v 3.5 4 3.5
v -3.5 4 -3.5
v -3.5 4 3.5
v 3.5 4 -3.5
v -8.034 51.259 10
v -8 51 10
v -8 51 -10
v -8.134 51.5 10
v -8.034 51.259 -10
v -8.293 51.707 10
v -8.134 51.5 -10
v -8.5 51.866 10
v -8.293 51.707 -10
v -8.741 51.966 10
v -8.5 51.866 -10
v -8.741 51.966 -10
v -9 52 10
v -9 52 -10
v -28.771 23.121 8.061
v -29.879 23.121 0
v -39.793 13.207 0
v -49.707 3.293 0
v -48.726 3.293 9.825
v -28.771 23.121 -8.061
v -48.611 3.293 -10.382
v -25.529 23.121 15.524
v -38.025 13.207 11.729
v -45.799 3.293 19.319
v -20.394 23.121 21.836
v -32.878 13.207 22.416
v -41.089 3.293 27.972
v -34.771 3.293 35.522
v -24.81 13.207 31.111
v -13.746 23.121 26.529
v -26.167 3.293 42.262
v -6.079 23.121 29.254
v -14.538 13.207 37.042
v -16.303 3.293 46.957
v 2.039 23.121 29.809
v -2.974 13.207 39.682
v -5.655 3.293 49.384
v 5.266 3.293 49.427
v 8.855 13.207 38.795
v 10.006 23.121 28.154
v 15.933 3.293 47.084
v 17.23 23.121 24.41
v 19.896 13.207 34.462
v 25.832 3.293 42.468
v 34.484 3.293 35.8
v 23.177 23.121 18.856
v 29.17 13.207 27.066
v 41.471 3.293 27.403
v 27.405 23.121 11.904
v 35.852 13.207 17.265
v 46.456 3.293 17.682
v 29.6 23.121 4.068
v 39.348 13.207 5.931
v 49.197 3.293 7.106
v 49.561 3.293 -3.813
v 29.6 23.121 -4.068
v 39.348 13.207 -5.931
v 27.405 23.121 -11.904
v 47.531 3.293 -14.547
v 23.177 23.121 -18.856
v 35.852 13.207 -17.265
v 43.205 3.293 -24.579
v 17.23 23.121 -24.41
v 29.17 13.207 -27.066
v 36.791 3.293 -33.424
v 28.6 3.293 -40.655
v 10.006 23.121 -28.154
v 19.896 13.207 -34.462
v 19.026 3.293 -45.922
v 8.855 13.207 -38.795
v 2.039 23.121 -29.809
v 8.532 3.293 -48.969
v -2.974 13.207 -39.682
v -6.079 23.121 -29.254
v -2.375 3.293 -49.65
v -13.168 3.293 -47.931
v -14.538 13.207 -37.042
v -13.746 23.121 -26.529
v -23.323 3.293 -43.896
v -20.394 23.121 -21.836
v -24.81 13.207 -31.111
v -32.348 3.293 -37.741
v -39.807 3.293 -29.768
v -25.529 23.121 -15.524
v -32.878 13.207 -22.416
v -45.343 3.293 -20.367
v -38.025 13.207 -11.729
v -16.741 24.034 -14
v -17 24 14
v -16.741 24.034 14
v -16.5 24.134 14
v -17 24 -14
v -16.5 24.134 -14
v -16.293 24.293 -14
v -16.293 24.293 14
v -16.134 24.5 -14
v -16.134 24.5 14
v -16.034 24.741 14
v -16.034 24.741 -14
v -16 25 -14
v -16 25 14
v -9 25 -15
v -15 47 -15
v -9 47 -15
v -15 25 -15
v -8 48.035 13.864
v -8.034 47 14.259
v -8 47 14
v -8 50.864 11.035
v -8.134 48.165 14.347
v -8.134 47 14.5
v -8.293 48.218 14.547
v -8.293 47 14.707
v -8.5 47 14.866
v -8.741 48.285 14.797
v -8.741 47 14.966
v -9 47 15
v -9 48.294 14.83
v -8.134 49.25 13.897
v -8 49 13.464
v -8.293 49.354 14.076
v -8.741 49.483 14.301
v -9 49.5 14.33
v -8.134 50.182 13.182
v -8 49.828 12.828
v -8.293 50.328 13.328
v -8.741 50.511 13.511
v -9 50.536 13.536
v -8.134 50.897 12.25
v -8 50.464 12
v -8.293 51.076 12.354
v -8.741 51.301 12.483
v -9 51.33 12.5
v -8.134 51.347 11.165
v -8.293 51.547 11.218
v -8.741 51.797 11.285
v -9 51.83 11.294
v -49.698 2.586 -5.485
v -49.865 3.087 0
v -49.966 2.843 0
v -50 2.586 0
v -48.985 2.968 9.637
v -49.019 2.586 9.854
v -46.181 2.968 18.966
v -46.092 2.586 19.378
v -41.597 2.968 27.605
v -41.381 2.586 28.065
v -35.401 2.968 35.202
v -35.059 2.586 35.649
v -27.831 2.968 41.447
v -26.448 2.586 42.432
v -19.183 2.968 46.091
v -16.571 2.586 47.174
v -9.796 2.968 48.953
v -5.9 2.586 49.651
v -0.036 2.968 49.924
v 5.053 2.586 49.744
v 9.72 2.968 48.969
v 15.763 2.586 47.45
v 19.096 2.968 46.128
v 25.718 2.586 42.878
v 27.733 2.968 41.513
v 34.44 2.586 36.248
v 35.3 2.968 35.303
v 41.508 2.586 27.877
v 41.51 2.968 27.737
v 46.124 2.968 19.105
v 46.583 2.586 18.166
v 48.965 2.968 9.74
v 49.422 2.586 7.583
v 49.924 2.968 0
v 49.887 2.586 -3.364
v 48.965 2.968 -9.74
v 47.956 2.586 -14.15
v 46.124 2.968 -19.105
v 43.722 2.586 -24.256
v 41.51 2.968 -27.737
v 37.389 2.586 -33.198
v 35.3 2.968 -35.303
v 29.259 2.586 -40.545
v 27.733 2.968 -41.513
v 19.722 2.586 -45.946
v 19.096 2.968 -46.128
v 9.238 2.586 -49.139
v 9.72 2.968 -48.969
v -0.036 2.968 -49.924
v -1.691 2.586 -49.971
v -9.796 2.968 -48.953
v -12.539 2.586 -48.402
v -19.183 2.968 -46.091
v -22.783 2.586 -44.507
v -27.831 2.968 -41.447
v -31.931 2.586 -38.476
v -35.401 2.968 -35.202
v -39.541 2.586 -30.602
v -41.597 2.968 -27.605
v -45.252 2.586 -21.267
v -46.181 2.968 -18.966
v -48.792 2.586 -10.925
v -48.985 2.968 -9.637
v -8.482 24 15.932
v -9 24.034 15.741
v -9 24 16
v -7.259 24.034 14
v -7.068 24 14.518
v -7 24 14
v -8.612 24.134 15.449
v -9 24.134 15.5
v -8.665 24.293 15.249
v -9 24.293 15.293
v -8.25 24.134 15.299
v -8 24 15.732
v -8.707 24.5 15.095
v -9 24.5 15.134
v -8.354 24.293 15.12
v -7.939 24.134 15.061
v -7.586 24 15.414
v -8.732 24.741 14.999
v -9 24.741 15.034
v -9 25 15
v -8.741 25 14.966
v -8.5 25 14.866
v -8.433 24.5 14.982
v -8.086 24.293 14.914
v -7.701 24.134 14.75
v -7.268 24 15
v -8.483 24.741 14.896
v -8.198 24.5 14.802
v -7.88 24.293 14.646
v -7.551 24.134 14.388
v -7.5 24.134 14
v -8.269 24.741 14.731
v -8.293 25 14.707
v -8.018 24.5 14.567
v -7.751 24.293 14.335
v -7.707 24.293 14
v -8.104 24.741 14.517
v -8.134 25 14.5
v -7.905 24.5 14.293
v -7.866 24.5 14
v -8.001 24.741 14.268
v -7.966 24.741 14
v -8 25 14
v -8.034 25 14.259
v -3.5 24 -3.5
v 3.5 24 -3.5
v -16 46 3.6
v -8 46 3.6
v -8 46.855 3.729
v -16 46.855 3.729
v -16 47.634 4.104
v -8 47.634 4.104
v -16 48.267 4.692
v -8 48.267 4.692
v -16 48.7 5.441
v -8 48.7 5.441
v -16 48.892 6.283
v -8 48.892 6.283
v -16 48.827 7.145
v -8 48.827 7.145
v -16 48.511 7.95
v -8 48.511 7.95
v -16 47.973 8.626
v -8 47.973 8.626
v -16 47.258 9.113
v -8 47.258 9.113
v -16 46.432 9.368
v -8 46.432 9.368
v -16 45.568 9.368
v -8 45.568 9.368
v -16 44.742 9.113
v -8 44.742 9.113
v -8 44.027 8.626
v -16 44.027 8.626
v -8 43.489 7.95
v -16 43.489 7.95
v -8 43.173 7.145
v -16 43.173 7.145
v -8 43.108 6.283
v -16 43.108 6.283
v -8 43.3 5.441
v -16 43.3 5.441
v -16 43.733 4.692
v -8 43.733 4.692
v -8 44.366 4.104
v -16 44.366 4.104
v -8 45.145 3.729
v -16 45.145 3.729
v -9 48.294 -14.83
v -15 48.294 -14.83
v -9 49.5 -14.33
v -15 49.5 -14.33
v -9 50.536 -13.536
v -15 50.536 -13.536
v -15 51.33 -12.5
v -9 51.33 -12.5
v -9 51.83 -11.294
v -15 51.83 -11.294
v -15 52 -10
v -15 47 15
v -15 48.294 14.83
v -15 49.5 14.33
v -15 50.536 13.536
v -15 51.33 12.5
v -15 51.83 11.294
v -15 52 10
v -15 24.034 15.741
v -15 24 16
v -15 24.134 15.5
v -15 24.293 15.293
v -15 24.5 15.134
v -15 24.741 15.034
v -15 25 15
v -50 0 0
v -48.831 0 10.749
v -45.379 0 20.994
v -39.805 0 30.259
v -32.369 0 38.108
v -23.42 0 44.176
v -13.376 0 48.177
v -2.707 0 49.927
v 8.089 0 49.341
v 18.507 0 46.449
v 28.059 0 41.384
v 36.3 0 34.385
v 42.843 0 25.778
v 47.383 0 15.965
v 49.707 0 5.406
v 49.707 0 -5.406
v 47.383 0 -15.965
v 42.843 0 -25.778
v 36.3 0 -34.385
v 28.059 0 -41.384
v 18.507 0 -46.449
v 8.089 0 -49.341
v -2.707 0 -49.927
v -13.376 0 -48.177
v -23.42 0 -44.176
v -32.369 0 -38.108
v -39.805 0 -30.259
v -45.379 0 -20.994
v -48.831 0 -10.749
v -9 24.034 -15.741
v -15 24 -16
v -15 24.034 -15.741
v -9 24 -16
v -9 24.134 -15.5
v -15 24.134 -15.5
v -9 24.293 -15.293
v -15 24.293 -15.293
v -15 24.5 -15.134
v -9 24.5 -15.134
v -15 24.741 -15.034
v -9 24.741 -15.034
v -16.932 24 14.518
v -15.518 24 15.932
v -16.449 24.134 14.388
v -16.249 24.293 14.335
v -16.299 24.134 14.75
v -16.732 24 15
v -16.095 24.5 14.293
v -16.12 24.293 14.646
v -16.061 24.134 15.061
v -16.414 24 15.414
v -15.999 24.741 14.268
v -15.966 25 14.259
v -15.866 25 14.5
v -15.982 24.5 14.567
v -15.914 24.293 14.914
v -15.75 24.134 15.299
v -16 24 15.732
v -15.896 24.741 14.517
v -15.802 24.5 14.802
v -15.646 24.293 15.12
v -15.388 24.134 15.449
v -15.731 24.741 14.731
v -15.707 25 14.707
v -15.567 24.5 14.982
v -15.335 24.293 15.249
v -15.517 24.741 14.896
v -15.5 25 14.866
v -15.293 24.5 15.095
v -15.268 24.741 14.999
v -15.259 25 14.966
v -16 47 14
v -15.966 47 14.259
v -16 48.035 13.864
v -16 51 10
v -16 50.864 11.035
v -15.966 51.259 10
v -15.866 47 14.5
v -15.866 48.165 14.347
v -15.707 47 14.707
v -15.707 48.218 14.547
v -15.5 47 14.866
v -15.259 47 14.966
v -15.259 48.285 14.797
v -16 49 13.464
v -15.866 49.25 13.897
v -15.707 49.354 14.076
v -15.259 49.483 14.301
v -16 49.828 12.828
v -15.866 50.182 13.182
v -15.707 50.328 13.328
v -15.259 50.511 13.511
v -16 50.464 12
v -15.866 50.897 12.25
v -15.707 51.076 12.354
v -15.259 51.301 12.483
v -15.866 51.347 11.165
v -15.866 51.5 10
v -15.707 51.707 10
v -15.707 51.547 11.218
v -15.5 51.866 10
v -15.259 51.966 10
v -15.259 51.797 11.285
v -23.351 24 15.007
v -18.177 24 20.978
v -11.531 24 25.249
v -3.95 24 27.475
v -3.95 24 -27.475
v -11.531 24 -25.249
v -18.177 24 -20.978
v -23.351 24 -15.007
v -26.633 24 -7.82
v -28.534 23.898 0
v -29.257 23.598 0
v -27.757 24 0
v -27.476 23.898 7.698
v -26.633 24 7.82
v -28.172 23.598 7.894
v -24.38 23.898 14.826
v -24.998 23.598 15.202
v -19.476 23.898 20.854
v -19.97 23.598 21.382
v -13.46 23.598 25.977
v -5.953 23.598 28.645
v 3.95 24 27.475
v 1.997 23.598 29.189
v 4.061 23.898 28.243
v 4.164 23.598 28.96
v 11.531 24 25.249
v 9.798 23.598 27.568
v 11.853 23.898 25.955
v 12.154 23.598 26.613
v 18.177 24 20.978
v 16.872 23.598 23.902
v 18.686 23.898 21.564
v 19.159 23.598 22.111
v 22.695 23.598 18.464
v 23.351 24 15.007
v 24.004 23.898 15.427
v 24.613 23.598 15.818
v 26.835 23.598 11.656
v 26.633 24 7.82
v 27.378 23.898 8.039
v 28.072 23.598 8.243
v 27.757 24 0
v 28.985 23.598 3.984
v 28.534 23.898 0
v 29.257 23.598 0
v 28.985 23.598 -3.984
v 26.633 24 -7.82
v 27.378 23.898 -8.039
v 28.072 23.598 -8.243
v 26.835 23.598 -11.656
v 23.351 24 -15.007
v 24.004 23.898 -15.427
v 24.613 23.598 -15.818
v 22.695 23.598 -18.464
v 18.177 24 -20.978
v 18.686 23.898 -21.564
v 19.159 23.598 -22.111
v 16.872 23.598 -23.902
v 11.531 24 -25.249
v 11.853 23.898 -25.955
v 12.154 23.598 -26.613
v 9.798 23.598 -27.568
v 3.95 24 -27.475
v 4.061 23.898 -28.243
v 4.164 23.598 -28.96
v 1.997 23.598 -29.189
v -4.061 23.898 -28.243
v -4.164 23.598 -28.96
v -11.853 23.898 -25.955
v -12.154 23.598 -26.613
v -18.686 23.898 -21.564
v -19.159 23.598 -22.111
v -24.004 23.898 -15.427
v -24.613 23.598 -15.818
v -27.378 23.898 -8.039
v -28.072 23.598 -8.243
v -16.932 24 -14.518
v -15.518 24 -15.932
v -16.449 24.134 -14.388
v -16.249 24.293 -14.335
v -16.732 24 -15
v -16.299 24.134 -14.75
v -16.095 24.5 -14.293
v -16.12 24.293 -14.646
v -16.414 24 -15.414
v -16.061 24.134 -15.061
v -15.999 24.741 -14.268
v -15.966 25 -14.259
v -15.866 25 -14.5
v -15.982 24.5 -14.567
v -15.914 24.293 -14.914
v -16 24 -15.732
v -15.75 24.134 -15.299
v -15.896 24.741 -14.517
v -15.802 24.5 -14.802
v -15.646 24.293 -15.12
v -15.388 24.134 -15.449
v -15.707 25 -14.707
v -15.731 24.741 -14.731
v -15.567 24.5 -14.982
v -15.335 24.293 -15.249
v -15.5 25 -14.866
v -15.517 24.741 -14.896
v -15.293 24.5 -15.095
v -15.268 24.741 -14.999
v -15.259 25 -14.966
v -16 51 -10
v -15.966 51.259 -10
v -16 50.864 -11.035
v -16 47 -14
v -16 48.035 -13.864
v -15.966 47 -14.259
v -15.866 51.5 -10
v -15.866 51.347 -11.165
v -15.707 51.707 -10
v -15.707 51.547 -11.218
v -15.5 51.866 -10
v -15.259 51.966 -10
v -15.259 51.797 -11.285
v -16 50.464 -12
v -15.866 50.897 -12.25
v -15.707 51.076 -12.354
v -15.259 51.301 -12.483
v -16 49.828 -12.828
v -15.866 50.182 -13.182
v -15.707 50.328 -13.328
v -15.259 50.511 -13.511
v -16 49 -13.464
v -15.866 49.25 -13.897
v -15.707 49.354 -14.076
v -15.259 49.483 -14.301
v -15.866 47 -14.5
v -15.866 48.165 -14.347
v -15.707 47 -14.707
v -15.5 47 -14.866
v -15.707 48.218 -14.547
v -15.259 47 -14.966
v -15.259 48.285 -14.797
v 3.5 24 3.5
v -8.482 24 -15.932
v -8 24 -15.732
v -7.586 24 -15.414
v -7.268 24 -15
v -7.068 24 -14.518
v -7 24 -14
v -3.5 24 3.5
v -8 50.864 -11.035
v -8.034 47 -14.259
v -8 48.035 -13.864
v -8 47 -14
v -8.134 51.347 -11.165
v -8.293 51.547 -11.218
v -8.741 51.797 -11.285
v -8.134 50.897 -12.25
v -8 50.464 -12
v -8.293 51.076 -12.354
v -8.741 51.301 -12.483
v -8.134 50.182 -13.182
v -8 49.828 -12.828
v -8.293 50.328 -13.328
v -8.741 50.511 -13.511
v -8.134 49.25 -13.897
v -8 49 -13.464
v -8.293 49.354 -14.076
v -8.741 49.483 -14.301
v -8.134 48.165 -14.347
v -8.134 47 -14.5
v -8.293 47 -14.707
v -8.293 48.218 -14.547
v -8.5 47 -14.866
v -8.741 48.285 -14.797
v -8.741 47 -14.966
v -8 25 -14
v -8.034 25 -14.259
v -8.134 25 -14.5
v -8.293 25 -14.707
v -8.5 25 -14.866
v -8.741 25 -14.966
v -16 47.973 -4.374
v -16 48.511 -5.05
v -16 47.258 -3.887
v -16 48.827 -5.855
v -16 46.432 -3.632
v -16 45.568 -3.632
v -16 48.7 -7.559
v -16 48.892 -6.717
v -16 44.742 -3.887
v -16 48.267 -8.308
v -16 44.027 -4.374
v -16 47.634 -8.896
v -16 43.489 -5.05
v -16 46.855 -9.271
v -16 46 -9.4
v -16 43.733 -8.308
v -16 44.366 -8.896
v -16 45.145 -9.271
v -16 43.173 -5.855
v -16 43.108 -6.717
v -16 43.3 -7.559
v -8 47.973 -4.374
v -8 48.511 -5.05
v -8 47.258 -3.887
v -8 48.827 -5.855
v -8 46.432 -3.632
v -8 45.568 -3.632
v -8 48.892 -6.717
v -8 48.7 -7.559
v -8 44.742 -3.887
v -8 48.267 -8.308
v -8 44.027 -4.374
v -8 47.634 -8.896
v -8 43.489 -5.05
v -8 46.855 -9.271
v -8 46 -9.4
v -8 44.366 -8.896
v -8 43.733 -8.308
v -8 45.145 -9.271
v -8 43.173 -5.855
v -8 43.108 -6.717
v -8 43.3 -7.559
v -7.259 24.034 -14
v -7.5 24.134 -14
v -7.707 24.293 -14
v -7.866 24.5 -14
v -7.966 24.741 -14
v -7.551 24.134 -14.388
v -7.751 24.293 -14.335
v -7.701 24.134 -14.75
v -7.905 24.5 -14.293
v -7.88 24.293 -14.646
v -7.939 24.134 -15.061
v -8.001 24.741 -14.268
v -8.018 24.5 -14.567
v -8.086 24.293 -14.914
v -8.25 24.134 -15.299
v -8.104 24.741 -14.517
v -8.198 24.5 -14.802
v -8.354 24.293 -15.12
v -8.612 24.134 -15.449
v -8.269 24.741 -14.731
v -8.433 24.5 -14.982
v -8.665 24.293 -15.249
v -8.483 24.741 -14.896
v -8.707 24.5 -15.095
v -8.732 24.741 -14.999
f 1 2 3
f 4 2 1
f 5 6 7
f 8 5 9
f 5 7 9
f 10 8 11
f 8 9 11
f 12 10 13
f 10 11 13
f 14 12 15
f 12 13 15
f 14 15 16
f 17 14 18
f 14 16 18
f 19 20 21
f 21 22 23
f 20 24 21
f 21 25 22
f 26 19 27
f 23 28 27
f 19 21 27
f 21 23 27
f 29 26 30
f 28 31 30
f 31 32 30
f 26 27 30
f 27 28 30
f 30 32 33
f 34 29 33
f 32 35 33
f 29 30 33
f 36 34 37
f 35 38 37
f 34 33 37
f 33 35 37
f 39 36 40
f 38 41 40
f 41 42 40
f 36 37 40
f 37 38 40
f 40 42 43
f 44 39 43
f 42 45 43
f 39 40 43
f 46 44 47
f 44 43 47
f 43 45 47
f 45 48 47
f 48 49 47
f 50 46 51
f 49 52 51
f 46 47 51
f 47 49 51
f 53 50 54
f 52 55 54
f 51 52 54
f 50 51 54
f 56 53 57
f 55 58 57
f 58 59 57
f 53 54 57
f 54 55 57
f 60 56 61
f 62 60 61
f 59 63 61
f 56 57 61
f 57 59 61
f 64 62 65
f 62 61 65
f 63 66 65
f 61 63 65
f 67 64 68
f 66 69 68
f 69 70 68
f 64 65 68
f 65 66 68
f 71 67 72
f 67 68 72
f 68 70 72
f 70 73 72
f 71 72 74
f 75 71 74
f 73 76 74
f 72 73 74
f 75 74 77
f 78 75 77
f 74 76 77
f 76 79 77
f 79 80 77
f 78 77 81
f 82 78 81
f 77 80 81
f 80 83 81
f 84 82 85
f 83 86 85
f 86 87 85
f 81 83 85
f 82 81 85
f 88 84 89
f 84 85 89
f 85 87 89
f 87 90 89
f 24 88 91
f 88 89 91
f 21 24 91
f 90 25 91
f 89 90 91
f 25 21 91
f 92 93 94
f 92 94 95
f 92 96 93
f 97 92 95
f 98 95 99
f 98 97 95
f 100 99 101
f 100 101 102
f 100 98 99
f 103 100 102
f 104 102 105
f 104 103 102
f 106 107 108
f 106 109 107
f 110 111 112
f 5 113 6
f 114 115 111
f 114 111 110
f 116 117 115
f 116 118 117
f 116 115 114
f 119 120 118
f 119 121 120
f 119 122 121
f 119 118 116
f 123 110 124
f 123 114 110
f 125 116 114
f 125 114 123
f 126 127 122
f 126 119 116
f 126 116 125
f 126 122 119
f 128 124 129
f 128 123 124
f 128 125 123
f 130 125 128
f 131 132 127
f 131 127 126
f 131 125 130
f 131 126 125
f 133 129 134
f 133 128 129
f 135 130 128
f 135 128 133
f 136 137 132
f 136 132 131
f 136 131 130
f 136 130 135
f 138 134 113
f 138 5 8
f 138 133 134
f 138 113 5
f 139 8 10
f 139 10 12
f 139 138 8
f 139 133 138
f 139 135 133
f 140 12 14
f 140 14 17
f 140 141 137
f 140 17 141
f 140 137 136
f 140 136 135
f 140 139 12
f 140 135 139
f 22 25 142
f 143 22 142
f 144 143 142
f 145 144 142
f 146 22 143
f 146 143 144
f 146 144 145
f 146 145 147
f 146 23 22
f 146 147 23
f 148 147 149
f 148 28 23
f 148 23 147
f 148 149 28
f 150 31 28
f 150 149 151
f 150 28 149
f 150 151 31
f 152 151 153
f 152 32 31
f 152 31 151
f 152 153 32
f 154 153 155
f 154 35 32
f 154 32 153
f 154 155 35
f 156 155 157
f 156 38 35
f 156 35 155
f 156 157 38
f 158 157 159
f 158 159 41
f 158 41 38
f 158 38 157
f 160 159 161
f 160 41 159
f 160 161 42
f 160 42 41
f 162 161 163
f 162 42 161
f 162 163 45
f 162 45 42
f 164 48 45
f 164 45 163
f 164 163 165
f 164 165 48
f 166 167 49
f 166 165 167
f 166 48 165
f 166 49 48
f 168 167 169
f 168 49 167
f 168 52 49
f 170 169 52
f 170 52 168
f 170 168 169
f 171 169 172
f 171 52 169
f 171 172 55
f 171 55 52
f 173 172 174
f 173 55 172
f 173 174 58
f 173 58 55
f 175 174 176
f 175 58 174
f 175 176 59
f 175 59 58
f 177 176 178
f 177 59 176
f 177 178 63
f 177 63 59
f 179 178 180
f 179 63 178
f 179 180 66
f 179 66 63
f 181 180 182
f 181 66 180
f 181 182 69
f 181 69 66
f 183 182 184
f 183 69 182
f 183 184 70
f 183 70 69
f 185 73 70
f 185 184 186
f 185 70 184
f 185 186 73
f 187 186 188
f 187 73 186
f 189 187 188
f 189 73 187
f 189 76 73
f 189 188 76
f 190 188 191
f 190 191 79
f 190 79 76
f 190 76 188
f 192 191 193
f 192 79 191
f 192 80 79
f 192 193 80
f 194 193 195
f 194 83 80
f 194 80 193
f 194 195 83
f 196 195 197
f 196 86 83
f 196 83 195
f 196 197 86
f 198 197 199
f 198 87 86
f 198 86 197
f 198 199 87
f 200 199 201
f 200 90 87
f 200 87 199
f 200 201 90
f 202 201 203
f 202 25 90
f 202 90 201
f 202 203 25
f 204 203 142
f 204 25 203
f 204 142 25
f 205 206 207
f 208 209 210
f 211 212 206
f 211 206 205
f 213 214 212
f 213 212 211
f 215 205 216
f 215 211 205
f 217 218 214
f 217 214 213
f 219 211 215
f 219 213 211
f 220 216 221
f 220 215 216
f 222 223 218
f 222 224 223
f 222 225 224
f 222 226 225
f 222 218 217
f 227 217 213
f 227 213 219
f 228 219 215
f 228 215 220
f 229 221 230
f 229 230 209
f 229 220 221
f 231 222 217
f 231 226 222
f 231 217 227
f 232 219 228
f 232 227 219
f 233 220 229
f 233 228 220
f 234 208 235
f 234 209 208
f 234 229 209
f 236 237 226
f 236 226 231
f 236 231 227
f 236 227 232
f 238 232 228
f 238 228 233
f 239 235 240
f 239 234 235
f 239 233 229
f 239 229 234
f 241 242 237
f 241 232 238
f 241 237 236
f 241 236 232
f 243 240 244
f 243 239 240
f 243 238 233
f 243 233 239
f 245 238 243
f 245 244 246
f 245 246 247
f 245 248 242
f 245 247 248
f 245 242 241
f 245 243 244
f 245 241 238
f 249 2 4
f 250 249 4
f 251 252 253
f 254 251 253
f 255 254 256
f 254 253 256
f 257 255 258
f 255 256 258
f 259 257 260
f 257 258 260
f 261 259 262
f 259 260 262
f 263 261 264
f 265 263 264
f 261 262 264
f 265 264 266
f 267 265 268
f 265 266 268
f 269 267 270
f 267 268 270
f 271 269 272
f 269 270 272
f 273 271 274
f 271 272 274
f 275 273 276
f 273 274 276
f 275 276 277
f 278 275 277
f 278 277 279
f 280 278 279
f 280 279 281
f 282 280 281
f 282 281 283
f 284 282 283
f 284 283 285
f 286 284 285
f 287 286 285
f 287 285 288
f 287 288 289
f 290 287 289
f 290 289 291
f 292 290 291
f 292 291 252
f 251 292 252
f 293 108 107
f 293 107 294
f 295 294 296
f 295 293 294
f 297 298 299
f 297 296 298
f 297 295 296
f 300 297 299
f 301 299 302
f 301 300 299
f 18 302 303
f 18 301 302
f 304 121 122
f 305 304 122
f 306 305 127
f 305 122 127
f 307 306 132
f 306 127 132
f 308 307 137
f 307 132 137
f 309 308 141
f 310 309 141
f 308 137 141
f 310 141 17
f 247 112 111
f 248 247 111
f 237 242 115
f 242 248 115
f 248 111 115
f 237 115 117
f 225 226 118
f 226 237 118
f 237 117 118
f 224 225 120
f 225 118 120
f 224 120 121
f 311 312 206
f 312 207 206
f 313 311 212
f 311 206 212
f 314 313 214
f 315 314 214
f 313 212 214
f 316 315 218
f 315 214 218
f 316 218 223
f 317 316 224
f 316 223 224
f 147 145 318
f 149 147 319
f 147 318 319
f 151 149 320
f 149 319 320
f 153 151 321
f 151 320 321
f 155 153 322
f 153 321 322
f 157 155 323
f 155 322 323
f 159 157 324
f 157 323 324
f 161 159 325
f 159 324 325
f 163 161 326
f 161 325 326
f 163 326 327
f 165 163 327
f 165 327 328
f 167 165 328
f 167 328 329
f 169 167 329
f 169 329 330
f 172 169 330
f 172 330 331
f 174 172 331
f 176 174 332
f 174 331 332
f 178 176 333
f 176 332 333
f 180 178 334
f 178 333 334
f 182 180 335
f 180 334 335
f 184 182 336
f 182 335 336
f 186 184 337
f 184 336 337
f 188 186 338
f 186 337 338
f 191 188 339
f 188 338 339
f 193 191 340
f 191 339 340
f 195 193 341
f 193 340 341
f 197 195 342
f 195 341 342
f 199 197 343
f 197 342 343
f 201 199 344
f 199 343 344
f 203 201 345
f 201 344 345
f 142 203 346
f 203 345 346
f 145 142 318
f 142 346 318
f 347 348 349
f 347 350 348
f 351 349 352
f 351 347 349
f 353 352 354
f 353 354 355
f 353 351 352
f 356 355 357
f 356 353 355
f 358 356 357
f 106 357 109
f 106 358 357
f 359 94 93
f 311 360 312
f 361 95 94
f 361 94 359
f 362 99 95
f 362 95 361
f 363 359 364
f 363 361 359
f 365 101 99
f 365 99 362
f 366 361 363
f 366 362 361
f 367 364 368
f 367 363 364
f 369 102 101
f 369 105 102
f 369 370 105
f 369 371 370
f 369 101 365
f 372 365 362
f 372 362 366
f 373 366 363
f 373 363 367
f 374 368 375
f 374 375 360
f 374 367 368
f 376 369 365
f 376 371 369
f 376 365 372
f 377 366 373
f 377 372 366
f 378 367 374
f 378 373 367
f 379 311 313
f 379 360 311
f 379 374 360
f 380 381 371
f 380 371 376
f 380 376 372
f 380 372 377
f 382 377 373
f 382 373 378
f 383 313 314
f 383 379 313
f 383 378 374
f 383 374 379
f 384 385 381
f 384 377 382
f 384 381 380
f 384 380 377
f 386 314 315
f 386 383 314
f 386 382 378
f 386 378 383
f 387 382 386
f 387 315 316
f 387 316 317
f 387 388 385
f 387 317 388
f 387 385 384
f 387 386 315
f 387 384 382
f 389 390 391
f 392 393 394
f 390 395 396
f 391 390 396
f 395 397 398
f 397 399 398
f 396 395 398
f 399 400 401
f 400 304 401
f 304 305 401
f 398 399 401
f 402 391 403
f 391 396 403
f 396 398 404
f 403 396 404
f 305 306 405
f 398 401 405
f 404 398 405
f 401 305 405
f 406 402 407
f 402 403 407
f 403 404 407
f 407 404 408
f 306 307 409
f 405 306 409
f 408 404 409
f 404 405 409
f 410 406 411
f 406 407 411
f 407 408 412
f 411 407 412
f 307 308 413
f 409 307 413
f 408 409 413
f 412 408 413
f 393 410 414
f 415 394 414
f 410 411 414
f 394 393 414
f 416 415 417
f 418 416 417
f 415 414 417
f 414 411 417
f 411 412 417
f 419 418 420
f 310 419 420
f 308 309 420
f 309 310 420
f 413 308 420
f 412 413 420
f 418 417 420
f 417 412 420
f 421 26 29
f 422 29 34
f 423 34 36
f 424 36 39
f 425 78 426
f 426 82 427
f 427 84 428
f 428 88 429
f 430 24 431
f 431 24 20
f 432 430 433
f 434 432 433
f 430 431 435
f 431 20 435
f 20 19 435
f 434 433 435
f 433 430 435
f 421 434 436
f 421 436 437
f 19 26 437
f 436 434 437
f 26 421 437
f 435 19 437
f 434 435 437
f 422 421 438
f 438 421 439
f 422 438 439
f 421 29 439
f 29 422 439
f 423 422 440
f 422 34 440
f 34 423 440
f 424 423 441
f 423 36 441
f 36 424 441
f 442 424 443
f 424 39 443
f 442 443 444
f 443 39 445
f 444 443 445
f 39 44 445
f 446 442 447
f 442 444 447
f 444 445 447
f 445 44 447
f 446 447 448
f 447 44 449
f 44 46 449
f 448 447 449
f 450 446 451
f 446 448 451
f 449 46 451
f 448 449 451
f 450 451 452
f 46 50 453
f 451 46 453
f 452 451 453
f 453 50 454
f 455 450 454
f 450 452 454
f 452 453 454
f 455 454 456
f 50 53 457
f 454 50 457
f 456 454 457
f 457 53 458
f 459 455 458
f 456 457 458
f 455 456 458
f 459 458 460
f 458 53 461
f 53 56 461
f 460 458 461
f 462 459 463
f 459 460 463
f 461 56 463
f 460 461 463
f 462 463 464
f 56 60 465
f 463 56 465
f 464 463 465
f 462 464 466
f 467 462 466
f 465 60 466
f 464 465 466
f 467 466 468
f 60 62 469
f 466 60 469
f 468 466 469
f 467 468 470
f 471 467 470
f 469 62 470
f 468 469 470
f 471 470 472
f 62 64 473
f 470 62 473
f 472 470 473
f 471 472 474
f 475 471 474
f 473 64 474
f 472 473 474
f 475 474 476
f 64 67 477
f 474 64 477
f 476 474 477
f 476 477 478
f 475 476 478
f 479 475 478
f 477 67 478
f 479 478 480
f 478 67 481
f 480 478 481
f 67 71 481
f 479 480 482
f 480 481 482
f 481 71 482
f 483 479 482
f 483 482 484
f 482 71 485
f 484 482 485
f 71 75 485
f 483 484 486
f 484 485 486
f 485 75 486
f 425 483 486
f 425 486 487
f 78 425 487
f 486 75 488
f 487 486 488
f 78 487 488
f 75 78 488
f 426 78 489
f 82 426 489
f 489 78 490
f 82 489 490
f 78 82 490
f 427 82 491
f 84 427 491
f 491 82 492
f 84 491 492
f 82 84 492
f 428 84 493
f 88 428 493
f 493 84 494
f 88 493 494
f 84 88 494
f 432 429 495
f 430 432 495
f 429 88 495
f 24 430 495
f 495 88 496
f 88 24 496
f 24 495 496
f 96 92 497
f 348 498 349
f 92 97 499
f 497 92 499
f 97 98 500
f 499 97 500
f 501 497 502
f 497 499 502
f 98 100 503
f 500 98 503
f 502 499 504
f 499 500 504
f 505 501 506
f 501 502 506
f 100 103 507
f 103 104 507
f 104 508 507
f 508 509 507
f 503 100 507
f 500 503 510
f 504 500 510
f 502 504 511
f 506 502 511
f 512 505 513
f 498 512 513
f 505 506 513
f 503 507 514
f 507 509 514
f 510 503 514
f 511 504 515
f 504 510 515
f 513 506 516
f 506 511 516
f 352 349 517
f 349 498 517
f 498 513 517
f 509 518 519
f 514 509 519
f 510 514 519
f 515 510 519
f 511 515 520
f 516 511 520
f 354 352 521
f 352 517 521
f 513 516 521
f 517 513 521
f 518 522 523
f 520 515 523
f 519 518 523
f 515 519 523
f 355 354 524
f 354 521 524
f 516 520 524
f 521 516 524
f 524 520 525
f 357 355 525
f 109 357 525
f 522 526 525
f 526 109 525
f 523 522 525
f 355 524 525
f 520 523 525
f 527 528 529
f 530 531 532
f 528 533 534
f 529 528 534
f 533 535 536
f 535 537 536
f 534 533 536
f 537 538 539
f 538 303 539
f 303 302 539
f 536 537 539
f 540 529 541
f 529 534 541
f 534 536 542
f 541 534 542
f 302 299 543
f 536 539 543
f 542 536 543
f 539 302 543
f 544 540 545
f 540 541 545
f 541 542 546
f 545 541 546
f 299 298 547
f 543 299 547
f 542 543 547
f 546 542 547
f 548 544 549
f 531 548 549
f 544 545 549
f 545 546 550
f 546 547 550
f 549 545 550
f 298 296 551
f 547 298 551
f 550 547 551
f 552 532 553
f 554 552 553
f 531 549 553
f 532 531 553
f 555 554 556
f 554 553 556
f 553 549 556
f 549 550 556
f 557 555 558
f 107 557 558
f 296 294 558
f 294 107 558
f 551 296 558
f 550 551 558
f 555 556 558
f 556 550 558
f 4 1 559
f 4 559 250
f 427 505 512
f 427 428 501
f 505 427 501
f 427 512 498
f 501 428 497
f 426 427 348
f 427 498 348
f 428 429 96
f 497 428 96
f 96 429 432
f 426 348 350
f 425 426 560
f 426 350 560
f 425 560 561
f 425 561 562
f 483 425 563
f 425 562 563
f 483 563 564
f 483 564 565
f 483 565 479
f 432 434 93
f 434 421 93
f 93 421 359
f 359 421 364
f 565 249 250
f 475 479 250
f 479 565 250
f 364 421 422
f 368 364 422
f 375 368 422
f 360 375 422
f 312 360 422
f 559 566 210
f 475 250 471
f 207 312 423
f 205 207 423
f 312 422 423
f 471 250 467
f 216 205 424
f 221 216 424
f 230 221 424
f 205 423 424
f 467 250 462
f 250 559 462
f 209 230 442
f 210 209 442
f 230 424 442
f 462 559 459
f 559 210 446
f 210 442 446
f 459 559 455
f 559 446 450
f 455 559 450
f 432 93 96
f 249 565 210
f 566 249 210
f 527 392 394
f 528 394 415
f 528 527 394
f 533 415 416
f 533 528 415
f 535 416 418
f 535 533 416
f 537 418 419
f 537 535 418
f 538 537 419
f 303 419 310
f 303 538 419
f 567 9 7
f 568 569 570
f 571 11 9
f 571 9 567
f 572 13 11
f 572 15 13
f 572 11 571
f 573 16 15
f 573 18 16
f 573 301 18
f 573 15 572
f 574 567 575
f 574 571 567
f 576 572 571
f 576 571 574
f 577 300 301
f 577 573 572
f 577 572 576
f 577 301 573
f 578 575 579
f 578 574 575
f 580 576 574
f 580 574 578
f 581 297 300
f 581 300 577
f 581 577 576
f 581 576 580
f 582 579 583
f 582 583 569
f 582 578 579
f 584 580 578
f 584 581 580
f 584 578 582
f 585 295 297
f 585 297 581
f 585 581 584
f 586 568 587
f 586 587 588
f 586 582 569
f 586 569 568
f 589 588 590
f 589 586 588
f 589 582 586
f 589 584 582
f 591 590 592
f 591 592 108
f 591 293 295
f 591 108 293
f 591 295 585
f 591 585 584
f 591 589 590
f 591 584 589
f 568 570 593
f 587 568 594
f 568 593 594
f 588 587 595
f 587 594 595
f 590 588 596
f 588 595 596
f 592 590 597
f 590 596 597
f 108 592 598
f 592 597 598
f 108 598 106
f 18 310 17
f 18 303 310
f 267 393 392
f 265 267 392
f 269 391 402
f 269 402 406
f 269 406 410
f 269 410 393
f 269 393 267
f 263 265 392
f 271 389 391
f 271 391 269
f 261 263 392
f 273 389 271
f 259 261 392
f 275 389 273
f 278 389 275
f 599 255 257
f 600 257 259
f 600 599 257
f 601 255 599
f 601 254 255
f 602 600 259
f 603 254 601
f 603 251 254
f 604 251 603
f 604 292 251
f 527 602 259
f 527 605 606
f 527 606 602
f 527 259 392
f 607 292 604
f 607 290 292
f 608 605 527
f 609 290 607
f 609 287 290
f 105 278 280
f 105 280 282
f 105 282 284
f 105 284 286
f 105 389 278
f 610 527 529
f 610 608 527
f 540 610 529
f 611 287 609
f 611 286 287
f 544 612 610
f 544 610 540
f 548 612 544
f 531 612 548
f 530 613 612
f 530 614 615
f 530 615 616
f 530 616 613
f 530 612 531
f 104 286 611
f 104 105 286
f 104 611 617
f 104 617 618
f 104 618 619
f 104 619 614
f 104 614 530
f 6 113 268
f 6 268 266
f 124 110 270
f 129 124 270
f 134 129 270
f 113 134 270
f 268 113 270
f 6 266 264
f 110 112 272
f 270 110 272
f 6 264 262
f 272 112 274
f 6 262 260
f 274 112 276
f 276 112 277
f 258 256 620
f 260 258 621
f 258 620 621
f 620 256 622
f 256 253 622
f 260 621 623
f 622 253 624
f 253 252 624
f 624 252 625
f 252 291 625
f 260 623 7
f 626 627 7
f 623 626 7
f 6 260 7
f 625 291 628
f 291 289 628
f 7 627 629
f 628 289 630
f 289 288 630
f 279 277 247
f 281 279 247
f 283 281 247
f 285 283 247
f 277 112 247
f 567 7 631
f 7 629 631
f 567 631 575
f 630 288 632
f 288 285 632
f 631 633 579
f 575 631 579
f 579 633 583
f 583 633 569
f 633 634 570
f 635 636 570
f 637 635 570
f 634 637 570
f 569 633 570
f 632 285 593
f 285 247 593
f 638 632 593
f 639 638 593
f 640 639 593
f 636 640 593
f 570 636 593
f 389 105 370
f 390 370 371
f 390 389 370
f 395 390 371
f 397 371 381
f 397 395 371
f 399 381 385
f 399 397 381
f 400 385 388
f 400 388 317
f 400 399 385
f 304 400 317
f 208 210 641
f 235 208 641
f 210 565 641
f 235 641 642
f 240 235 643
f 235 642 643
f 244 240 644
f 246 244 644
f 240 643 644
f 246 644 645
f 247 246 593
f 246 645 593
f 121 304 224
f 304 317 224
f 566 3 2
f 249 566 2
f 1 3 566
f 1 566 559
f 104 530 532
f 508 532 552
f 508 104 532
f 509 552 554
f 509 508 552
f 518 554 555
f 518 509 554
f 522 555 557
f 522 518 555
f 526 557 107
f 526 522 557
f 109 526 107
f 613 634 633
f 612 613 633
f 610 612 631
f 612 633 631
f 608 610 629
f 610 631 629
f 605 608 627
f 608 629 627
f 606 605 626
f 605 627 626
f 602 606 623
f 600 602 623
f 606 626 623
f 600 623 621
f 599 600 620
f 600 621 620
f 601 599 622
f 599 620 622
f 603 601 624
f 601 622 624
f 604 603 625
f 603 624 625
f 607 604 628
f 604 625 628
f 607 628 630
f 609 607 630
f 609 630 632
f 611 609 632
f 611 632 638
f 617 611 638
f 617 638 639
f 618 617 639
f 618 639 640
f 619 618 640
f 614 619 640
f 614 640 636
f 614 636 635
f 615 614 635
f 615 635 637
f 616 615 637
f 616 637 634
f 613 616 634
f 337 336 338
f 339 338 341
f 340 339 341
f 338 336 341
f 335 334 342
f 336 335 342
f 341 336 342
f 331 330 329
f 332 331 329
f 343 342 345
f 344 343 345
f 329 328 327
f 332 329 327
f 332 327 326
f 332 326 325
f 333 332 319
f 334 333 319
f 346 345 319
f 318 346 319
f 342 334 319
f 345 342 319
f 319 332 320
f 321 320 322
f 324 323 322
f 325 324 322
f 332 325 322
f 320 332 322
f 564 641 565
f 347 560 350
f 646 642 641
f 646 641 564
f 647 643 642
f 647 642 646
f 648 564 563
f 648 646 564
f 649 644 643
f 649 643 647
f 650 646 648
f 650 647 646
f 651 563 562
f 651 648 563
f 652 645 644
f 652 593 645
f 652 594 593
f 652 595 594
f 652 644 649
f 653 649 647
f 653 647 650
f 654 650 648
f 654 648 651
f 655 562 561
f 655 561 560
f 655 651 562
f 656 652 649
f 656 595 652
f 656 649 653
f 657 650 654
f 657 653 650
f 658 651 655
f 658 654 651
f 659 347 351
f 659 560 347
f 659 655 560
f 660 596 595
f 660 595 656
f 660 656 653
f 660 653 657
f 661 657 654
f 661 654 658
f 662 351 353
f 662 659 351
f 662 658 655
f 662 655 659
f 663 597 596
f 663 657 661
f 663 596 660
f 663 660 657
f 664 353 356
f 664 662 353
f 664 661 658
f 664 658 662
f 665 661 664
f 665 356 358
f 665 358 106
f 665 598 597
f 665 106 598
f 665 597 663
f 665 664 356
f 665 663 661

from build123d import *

# Parameters (mm, degrees)
SKETCH2_W           = 8
SKETCH2_H           = 30
BOSS_EXTRUDE1_DEPTH = 28
CUT_EXTRUDE1_REACH  = 52
SKETCH3_R           = 2.9
FILLET1_R           = 5
FILLET2_R           = 3
FILLET3_R           = 1
FILLET4_R           = 1
SKETCH4_W           = 7
SKETCH4_H           = 7
CUT_EXTRUDE2_DEPTH  = 20


with BuildPart() as part:
    # Sketch1 → Revolve1 (revolve)
    with BuildSketch(Plane.XY):
        Polygon((0, 0), (0, 24), (-29, 24), (-50, 3), (-50, 0), align=None)
    revolve(axis=Axis((0, 0, 0), (0, 1, 0)))

    # Sketch2 → Boss-Extrude1 (add)
    with BuildSketch(Plane(origin=(0, 24, 0), x_dir=(1, 0, 0), z_dir=(0, 1, 0))):
        with Locations((-12, 0)):
            Rectangle(SKETCH2_W, SKETCH2_H)
    extrude(amount=BOSS_EXTRUDE1_DEPTH)

    # Sketch3 → Cut-Extrude1 (cut, up to next)
    with BuildSketch(Plane(origin=(0, 0, 0), x_dir=(0, 0, -1), z_dir=(1, 0, 0)), mode=Mode.PRIVATE) as cut_extrude1_sk1:
        with Locations((-6.5, 46)):
            Circle(SKETCH3_R)
    cut_extrude1_tool1 = extrude(cut_extrude1_sk1.sketch, amount=-CUT_EXTRUDE1_REACH, mode=Mode.PRIVATE) & part.part
    add(cut_extrude1_tool1.solids().sort_by_distance((0, 46, 6.5))[0], mode=Mode.SUBTRACT)
    # Sketch3 → Cut-Extrude1 (cut, up to next)
    with BuildSketch(Plane(origin=(0, 0, 0), x_dir=(0, 0, -1), z_dir=(1, 0, 0)), mode=Mode.PRIVATE) as cut_extrude1_sk2:
        with Locations((6.5, 46)):
            Circle(SKETCH3_R)
    cut_extrude1_tool2 = extrude(cut_extrude1_sk2.sketch, amount=-CUT_EXTRUDE1_REACH, mode=Mode.PRIVATE) & part.part
    add(cut_extrude1_tool2.solids().sort_by_distance((0, 46, -6.5))[0], mode=Mode.SUBTRACT)

    # Fillet1
    fillet1_edges = [part.edges().sort_by_distance(p)[0] for p in [
        (-12, 52, 15),
        (-12, 52, -15),
    ]]
    fillet(fillet1_edges, radius=FILLET1_R)

    # Fillet2
    fillet2_edges = [part.edges().sort_by_distance(p)[0] for p in [
        (29, 24, 0),
    ]]
    fillet(fillet2_edges, radius=FILLET2_R)

    # Fillet3
    fillet3_edges = [part.edges().sort_by_distance(p)[0] for p in [
        (50, 3, 0),
    ]]
    fillet(fillet3_edges, radius=FILLET3_R)

    # Fillet4
    fillet4_edges = [part.edges().sort_by_distance(p)[0] for p in [
        (-16, 24, 0),
        (-12, 24, 15),
        (-8, 24, 0),
        (-12, 24, -15),
        (-16, 52, 0),
        (-8, 52, 0),
        (-16, 35.5, 15),
        (-16, 35.5, -15),
        (-16, 50.535533906, 13.535533906),
        (-16, 50.535533906, -13.535533906),
        (-8, 35.5, -15),
        (-8, 35.5, 15),
        (-8, 50.535533906, 13.535533906),
        (-8, 50.535533906, -13.535533906),
    ]]
    fillet(fillet4_edges, radius=FILLET4_R)

    # Sketch4 → Cut-Extrude2 (cut)
    with BuildSketch(Plane(origin=(0, 24, 0), x_dir=(1, 0, 0), z_dir=(0, 1, 0))):
        Rectangle(SKETCH4_W, SKETCH4_H)
    extrude(amount=-CUT_EXTRUDE2_DEPTH, mode=Mode.SUBTRACT)


solid = part.part
